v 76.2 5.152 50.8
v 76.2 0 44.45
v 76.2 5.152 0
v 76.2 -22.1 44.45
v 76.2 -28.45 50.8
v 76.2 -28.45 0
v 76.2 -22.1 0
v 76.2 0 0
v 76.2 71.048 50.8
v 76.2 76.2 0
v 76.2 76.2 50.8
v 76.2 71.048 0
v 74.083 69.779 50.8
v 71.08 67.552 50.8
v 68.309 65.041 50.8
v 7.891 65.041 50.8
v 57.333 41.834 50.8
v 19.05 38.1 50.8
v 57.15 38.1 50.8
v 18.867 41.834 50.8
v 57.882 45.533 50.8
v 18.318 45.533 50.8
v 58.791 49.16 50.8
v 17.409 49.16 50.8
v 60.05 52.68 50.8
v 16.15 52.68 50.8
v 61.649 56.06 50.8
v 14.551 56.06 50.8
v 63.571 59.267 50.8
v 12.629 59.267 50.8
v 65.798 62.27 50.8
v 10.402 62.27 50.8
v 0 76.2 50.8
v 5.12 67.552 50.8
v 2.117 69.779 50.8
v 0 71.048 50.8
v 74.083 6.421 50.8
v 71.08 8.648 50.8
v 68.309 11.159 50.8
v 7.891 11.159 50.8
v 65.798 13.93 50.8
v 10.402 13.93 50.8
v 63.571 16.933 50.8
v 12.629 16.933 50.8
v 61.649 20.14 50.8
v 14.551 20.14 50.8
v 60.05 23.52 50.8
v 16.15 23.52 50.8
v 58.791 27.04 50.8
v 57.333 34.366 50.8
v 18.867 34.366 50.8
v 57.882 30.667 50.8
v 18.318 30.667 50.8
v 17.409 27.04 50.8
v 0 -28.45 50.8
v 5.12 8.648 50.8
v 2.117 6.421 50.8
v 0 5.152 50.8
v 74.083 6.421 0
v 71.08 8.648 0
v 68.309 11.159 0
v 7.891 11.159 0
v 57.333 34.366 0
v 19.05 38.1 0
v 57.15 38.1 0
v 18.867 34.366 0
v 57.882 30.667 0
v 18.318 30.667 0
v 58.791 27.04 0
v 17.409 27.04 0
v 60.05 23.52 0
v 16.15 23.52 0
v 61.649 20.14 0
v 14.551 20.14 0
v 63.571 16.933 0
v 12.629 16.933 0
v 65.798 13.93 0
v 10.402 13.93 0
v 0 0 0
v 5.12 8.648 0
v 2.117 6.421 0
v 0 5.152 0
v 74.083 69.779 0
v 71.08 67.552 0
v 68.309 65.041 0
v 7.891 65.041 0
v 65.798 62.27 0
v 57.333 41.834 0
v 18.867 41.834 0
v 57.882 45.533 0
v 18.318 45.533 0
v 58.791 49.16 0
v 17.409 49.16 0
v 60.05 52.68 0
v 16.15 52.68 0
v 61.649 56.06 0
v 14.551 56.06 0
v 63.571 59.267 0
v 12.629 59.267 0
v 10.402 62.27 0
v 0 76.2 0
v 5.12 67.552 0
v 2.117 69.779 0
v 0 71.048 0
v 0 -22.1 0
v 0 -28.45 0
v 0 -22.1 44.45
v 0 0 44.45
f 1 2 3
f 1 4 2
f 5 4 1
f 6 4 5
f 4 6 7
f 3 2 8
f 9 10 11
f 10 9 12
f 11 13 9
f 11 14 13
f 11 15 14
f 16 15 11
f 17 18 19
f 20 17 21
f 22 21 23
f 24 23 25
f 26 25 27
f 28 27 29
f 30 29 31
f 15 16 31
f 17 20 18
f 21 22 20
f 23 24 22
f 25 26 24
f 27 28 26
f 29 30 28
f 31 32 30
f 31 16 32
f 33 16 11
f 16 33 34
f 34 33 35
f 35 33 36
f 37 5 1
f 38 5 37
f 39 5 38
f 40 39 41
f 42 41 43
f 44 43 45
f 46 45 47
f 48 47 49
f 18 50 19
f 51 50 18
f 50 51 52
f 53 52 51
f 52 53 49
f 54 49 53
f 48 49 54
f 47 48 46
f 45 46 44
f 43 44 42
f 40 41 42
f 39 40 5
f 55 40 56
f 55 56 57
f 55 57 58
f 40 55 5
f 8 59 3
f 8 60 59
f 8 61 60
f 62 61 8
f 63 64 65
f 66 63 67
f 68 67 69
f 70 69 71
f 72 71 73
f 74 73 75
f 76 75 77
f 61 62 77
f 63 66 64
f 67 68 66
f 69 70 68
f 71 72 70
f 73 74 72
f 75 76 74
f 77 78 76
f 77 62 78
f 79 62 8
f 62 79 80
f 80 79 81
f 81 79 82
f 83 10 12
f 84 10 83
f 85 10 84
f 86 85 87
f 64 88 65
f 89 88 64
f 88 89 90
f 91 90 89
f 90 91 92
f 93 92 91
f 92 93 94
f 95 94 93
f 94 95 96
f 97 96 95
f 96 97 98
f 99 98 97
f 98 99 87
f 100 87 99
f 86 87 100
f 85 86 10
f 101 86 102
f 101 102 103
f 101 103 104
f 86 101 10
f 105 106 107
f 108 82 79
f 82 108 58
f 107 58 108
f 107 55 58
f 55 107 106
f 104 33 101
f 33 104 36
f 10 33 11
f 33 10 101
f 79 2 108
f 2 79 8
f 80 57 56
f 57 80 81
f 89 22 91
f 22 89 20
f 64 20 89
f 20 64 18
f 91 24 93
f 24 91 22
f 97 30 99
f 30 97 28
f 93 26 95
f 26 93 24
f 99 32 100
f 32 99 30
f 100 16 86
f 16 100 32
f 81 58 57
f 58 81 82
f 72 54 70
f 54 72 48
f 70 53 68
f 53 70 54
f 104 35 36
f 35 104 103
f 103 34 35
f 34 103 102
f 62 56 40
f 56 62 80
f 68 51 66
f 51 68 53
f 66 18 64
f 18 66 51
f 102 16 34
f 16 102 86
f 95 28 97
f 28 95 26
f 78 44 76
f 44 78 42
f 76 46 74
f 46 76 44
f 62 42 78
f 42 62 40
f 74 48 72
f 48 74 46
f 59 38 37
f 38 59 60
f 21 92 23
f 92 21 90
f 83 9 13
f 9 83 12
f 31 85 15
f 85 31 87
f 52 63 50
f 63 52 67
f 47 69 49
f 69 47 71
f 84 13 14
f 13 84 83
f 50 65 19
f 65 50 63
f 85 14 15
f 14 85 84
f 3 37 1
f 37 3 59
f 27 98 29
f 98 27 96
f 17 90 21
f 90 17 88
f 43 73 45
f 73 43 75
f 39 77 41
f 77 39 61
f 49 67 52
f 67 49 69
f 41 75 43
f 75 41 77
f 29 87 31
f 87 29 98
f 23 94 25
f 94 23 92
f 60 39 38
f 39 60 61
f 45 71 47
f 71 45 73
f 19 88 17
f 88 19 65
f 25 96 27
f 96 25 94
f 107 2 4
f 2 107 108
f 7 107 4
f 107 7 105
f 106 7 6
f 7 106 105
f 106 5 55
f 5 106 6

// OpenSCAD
inch = 25.4;

spacer = [
    3 * inch,
    3 * inch,
    2 * inch,
];

clip_top = [
    spacer[0],
    22.1,
    .25 * inch,
];

clip_side = [
    spacer[0],
    clip_top[2],
    spacer[2],
];


cutout_h = 3 * inch;
cutout_r = 1.5 * inch;
roundness = 64;

difference() {
    cube(spacer);
    translate([-(cutout_r / 2), cutout_r, 0]) {
        cylinder(h = cutout_h, r = cutout_r, $fn = roundness);
    }
        translate([(cutout_r * 2.5), cutout_r, 0]) {
        cylinder(h = cutout_h, r = cutout_r, $fn = roundness);
    }
}

translate([0, -clip_top[1], (spacer[2] - clip_top[2])]) {
    cube(clip_top);
}

translate([0, -(clip_top[1] + clip_side[1]), (spacer[2] - clip_side[2])]) {
    cube(clip_side);
}
